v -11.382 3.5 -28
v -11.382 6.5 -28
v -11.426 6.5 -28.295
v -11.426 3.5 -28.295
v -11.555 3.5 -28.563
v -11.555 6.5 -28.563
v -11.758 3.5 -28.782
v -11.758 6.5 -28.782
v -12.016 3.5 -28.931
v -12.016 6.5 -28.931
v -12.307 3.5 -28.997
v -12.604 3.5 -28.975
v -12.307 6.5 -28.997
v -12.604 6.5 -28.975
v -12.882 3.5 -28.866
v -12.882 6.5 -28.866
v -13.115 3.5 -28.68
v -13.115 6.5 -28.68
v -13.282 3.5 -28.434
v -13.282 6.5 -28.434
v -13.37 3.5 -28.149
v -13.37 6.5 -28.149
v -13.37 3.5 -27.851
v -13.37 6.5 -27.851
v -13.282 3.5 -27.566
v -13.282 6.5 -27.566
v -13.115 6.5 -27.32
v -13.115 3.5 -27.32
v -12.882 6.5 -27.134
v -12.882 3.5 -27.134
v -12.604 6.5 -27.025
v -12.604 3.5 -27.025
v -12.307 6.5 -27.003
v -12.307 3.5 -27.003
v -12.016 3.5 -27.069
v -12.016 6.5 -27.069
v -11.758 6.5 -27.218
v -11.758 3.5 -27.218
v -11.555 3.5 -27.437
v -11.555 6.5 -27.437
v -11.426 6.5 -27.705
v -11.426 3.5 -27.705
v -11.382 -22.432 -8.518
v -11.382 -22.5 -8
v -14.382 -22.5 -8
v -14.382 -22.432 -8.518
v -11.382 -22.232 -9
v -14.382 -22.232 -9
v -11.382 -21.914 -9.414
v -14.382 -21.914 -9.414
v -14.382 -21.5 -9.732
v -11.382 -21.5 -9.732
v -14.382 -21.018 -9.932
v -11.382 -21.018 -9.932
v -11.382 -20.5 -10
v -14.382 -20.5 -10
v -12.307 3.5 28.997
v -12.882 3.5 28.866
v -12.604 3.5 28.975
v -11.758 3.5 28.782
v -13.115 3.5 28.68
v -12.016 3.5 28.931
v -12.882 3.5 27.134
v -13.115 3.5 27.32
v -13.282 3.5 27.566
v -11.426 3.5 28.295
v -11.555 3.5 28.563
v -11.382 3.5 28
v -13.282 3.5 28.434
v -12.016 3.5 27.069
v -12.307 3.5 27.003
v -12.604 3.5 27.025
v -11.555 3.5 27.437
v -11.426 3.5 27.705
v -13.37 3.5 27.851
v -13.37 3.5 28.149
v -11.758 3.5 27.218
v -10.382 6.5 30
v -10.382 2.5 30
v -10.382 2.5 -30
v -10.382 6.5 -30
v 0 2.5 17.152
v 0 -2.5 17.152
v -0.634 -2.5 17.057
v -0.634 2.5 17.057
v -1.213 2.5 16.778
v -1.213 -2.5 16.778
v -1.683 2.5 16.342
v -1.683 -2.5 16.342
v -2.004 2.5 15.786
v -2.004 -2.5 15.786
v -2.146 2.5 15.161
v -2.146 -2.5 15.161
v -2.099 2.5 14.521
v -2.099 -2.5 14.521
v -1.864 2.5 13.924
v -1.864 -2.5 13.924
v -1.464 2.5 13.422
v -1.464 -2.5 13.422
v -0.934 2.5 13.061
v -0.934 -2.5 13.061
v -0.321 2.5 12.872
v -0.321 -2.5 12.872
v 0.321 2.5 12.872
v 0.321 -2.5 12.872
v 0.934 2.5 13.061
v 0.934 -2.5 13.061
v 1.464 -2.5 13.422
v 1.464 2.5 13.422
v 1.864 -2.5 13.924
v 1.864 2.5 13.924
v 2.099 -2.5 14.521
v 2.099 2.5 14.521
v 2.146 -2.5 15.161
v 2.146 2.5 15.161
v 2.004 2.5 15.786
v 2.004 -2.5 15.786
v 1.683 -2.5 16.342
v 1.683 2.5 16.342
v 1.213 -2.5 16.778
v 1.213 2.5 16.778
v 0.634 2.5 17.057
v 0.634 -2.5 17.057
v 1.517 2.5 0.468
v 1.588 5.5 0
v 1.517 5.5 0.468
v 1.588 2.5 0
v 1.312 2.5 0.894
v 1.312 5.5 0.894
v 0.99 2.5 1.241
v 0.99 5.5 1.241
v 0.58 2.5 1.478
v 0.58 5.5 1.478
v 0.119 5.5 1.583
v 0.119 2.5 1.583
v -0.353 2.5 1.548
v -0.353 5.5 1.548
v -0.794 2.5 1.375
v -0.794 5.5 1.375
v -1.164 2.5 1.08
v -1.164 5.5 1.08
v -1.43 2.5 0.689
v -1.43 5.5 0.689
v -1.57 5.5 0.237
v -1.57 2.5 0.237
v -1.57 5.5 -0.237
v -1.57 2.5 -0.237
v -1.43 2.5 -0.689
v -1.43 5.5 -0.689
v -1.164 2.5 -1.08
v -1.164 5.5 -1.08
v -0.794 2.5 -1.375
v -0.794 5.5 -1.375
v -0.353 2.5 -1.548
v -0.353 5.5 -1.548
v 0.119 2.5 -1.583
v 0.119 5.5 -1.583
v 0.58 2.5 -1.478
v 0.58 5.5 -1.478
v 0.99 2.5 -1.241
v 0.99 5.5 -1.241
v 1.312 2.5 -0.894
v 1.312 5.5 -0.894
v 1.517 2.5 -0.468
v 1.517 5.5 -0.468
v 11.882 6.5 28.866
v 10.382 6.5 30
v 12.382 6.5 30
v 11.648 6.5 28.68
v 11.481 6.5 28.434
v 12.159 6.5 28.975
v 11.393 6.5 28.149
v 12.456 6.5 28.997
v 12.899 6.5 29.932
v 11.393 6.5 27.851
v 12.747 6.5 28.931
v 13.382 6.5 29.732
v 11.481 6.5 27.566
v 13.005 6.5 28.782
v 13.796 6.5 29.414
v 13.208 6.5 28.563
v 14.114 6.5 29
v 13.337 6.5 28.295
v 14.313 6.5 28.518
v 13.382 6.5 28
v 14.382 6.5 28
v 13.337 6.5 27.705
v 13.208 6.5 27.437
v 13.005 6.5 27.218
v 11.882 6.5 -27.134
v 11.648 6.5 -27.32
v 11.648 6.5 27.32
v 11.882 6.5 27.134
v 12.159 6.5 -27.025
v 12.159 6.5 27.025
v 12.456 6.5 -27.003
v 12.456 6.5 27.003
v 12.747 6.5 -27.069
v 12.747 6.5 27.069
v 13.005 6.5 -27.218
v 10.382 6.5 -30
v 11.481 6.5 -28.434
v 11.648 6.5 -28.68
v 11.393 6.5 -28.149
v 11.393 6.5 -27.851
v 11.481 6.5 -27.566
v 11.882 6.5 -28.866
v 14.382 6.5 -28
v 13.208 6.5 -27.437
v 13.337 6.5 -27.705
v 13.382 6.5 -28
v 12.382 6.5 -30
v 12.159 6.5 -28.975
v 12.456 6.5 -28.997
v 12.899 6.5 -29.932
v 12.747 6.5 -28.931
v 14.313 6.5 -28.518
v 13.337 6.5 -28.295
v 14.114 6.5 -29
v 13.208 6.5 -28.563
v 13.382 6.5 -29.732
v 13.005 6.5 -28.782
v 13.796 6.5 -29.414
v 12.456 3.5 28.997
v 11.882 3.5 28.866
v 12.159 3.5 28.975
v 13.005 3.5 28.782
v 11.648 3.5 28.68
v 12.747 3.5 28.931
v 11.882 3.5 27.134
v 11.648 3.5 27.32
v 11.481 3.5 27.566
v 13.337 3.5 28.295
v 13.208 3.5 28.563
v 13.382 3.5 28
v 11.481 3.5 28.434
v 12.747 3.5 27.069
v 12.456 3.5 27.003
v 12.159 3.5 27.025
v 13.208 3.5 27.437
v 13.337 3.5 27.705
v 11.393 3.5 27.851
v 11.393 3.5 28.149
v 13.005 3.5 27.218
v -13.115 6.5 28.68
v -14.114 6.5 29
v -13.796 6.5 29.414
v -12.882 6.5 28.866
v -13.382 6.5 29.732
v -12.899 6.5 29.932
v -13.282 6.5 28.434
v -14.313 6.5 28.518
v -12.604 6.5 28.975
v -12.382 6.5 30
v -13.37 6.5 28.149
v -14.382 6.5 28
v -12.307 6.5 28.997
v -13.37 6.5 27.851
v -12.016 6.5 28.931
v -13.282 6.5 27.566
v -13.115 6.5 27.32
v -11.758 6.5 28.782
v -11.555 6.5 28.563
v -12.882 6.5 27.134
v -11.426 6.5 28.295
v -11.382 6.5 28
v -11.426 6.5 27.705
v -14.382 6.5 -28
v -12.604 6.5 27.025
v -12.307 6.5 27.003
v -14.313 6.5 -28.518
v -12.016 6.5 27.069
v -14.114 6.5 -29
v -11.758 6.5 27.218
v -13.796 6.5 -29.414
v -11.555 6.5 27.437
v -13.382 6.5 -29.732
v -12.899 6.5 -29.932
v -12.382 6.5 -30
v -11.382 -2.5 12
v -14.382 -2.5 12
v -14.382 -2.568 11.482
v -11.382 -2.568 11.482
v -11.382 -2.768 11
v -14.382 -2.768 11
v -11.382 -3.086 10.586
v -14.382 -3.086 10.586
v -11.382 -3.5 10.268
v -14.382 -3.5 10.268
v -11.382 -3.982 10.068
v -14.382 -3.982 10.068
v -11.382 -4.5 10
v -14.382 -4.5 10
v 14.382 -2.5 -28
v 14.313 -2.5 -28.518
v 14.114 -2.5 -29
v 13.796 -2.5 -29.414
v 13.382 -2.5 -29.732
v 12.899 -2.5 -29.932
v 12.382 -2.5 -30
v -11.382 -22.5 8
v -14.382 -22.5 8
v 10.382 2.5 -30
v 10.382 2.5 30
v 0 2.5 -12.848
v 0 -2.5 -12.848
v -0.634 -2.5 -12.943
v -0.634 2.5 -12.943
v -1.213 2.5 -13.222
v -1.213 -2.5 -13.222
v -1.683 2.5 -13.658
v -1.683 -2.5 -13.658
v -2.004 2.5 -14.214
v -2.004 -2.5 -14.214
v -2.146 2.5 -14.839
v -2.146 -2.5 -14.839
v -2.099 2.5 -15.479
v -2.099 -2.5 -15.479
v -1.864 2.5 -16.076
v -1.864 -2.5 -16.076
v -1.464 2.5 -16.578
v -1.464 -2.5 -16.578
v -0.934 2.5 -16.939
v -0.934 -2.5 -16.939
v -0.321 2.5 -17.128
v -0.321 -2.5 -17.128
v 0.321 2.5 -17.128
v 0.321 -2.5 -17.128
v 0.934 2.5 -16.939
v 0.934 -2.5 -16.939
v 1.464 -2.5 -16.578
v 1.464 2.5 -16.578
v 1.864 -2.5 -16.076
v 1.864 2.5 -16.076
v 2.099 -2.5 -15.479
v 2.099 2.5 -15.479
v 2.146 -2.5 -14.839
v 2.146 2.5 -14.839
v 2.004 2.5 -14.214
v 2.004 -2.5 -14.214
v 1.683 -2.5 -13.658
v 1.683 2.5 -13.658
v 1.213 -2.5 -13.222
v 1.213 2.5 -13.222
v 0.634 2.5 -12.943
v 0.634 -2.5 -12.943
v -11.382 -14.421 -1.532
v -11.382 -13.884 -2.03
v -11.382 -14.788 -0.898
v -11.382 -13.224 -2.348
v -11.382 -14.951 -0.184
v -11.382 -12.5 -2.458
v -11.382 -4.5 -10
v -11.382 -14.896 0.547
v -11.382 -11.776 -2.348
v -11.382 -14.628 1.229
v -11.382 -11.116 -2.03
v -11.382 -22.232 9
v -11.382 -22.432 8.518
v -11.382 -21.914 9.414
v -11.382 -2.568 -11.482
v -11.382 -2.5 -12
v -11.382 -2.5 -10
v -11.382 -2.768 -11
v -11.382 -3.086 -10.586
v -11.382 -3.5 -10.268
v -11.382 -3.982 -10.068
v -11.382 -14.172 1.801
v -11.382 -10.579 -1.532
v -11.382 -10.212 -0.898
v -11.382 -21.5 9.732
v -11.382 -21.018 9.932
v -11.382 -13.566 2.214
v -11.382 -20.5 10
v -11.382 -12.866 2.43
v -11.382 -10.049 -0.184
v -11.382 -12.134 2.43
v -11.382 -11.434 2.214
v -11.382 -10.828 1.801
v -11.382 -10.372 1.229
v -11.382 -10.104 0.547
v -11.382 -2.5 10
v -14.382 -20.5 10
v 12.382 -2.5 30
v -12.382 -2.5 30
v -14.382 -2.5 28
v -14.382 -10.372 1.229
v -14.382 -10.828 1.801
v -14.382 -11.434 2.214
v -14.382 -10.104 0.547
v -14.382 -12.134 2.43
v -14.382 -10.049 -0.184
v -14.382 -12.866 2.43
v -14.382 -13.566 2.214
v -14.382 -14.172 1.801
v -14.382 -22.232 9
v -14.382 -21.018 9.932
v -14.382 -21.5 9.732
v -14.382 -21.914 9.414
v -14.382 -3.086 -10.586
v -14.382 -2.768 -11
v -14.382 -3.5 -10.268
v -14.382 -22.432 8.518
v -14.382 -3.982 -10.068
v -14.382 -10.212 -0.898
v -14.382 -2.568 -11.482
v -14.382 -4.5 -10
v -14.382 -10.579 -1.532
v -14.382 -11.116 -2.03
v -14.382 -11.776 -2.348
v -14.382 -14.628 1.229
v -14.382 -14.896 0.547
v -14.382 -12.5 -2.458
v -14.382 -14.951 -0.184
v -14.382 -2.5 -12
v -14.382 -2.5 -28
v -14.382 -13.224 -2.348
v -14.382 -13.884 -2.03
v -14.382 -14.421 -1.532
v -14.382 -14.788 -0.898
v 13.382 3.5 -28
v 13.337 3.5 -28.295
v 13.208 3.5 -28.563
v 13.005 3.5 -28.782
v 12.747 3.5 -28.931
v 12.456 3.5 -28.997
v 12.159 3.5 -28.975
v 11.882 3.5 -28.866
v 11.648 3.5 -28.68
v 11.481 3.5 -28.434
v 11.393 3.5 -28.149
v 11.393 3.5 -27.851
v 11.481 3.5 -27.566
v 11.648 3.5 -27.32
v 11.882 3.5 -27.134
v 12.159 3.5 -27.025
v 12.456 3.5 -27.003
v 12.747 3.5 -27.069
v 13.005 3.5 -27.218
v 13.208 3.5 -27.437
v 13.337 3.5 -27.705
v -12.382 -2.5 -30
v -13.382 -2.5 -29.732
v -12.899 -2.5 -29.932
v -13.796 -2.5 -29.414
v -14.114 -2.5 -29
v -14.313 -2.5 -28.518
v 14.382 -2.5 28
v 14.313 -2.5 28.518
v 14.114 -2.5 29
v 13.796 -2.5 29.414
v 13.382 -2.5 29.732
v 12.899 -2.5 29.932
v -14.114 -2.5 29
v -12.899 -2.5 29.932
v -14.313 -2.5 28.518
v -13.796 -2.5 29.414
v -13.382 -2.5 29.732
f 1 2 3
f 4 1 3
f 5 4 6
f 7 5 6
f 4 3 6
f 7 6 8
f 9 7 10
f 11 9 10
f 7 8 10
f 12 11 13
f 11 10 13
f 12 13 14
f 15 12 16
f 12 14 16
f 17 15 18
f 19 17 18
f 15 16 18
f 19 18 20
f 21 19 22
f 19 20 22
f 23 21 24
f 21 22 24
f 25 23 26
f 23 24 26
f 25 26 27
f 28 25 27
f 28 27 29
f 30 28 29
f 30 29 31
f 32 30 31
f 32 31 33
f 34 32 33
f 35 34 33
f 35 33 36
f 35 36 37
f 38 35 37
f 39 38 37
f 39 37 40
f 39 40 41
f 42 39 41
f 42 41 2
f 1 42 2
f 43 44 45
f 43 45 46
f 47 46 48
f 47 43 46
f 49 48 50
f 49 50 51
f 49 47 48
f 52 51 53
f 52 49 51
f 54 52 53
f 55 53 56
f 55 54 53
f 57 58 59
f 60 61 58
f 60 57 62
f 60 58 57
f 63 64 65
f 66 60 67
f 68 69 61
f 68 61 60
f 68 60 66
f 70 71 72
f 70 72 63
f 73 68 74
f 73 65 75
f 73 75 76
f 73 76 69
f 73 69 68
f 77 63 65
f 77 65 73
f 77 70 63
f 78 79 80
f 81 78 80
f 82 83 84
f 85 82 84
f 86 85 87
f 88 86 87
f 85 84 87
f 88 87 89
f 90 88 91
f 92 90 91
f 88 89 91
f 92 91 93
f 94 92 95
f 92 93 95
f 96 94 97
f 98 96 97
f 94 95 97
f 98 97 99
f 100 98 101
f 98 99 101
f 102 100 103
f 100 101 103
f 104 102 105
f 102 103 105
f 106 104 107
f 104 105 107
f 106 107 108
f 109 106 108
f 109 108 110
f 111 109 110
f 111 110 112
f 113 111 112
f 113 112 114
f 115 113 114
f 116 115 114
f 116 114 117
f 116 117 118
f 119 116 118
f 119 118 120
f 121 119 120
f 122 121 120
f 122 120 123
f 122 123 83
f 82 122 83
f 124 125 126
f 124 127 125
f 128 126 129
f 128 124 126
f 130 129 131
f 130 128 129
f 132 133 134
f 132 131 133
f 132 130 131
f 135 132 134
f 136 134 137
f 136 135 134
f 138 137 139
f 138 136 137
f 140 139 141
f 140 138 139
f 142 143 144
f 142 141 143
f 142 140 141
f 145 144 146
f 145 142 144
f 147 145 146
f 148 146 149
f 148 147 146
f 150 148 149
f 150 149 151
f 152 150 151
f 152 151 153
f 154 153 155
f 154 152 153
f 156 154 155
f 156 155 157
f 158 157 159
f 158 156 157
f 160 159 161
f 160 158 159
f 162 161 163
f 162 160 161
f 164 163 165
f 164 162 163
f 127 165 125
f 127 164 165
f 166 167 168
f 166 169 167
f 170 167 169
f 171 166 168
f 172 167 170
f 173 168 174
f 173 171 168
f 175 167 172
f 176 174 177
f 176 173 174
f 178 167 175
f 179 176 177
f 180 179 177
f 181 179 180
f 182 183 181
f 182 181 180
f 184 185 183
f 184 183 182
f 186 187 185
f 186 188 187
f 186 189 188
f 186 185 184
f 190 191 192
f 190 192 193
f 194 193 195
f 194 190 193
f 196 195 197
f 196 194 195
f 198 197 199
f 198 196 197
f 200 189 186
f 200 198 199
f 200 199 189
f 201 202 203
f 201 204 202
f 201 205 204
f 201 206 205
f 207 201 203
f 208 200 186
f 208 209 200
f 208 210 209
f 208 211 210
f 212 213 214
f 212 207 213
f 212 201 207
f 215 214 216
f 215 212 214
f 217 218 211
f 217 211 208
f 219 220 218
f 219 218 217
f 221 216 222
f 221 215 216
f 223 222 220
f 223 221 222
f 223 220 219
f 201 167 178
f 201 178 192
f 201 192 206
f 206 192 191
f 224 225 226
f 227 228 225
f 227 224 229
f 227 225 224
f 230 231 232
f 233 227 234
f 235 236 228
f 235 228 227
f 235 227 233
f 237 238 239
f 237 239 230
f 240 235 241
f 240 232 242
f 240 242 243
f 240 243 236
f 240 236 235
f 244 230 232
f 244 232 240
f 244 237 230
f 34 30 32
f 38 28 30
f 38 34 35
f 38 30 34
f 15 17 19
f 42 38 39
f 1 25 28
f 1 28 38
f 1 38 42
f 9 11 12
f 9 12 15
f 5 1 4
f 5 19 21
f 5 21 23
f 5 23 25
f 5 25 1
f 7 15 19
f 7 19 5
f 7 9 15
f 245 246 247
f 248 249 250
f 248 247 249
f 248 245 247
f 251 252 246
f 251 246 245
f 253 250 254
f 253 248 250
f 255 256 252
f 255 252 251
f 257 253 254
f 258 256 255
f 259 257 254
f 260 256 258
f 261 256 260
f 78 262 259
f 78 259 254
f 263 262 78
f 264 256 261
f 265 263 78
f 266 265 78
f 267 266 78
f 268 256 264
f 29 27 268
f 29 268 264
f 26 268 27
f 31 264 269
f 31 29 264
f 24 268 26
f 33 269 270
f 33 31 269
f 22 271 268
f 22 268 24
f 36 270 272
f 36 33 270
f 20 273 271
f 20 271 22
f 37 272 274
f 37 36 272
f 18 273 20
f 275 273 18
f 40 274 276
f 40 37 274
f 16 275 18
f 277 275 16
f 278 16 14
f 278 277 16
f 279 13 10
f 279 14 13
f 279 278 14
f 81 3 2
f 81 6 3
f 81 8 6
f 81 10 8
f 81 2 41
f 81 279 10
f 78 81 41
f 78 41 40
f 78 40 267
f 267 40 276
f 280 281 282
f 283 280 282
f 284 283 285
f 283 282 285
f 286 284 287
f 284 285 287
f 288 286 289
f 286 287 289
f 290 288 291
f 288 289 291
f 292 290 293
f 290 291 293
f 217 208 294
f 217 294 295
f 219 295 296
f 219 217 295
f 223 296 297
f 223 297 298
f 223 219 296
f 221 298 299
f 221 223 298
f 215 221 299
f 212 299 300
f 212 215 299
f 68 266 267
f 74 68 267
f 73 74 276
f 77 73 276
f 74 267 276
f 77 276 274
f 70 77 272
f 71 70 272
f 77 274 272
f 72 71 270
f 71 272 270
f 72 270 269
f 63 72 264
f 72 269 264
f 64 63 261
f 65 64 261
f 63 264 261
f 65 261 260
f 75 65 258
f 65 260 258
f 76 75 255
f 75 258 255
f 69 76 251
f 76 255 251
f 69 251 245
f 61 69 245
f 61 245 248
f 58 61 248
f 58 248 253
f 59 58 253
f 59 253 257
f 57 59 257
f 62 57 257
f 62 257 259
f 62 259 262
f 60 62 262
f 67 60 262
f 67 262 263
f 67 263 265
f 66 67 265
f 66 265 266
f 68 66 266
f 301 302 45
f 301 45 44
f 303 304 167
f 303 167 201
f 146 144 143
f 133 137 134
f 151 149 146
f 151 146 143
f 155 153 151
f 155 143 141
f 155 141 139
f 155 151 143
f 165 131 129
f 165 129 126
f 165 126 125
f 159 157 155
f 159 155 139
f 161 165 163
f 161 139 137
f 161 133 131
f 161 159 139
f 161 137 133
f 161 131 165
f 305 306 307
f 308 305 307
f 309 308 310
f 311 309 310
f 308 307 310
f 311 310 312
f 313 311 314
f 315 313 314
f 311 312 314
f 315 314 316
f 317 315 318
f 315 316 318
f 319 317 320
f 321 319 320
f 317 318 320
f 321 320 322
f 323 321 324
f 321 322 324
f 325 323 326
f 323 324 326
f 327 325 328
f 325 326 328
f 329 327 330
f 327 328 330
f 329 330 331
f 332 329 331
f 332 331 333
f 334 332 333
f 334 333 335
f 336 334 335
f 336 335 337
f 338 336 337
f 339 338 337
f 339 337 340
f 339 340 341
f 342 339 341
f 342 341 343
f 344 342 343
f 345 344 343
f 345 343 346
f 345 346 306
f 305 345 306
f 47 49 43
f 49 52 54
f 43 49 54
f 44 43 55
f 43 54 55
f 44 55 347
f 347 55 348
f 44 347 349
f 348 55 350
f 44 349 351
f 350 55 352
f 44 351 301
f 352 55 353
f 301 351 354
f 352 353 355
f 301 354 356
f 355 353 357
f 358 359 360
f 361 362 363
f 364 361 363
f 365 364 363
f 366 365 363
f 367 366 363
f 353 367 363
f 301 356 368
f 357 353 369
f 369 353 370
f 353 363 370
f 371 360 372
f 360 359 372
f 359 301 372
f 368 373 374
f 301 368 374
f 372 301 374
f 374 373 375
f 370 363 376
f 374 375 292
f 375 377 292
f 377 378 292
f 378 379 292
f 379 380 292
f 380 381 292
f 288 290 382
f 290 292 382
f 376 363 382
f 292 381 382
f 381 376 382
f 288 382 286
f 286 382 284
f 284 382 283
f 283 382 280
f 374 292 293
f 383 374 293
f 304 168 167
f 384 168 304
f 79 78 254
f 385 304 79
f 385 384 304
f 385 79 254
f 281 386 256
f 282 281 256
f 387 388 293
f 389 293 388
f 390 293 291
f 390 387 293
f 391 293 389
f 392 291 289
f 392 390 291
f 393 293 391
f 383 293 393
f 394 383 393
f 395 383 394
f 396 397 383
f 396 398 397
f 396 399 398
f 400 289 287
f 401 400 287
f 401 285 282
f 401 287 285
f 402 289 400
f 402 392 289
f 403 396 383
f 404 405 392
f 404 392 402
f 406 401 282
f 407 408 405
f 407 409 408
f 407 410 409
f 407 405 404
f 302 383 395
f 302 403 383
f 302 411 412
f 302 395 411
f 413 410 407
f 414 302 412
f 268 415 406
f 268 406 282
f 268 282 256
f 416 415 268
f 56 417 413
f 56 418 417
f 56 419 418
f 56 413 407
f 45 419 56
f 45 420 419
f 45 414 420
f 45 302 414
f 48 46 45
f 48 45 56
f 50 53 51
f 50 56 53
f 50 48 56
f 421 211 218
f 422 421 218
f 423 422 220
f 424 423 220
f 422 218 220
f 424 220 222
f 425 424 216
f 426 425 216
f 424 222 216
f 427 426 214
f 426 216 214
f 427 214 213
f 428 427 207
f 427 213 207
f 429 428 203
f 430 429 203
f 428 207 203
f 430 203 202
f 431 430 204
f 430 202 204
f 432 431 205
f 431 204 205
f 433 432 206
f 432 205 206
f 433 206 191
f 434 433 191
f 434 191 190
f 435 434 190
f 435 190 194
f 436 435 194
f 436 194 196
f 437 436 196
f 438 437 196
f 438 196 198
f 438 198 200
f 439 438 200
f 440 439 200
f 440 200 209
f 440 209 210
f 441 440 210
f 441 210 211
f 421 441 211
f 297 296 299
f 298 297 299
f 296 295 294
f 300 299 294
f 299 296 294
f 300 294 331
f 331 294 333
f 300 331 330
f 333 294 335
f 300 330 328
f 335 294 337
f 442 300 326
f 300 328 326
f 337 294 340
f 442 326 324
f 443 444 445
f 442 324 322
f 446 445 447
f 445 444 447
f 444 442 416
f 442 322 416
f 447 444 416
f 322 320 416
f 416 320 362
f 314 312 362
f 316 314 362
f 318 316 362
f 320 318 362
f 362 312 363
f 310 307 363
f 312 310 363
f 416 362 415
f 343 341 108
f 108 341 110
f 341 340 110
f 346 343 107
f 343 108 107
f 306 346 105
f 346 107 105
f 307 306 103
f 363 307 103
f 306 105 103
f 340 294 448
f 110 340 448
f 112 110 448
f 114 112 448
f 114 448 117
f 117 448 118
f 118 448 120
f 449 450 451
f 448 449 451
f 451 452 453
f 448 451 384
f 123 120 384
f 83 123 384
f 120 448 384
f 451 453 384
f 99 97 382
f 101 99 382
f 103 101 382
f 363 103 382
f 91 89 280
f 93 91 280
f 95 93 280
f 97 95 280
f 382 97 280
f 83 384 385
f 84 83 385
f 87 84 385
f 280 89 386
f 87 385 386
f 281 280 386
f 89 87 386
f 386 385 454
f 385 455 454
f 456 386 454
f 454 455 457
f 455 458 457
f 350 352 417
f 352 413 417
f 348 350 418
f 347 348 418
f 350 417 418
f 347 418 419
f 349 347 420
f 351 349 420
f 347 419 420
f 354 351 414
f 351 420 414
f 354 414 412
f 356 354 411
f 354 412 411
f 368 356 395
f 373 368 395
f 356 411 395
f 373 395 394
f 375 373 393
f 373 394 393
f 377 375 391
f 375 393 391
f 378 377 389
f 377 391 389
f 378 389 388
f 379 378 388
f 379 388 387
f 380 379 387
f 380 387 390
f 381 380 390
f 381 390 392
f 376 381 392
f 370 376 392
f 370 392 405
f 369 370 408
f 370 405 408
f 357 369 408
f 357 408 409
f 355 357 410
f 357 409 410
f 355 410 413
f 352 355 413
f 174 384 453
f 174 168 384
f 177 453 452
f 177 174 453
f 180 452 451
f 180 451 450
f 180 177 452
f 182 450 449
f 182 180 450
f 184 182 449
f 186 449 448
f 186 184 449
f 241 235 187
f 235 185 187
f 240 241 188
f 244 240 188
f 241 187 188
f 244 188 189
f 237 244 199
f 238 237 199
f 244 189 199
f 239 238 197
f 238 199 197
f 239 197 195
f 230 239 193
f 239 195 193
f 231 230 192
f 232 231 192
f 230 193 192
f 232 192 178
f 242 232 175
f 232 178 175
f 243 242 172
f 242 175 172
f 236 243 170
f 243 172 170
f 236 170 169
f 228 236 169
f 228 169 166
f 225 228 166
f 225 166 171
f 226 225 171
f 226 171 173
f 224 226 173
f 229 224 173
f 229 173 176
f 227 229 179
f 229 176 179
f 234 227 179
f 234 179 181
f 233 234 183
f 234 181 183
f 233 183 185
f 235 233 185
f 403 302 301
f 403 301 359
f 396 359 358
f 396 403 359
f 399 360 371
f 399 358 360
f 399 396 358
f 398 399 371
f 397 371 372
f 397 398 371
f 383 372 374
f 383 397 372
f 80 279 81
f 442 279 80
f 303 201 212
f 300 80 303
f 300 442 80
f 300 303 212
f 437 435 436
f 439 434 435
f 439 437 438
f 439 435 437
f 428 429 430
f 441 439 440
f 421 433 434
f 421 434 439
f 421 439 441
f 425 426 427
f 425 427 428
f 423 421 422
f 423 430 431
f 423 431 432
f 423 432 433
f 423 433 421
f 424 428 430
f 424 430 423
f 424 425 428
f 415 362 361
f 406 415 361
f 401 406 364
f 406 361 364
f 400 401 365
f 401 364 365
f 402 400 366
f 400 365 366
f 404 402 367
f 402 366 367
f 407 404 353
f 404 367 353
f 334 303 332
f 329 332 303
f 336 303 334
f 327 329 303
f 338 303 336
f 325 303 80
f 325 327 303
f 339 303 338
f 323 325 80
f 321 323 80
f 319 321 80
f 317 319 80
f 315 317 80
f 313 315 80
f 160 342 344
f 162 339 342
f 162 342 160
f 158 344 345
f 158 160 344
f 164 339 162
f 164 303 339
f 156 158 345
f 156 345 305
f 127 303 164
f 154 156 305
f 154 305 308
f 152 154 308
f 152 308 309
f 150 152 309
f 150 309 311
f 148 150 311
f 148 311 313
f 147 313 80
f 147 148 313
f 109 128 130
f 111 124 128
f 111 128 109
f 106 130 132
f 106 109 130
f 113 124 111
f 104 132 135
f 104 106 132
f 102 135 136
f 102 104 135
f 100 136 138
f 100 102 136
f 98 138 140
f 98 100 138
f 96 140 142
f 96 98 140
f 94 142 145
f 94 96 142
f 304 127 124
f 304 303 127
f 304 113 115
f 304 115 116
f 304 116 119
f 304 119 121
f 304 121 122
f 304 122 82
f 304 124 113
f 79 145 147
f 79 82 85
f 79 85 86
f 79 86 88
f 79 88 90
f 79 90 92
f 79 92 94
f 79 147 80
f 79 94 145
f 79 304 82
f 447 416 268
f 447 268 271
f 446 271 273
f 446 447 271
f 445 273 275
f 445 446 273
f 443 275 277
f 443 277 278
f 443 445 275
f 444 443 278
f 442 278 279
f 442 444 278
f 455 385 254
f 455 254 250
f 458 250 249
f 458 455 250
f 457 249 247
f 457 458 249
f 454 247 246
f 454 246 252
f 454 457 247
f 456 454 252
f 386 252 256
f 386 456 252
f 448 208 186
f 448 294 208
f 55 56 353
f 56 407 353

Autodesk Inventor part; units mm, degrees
ref_plane "YZ Plane" through (0, 0, 0) normal (1, 0, 0) x (0, 1, 0)
ref_plane "XZ Plane" through (0, 0, 0) normal (0, 1, 0) x (-1, 0, 0)
ref_plane "XY Plane" through (0, 0, 0) normal (0, 0, 1) x (1, 0, 0)
sketch "Sketch1" plane through (0, 0, 0) normal (0, 1, 0) x (-1, 0, 0)
  line L0 (-14.3815, 30) -> (14.3815, 30)
  line L1 (14.3815, 30) -> (14.3815, -30)
  line L2 (14.3815, -30) -> (-14.3815, -30)
  line L3 (-14.3815, -30) -> (-14.3815, 30)
  line L4 (-14.3815, 30) -> (14.3815, -30) construction
  line L5 (14.3815, 30) -> (-14.3815, -30) construction
  point P0 (0, 0)
  dimension "d0" = 60
  dimension "d1" = 28.763
extrude "Extrusion1" add sketch "Sketch1" along normal mid plane 5
sketch "Sketch2" plane through (0, 2.5, 0) normal (0, 1, 0) x (1, 0, 0)
  line L0 (-14.3815, -30) -> (14.3815, -30) projected
  line L1 (-14.3815, -30) -> (-10.3815, -30)
  line L2 (-10.3815, -30) -> (-10.3815, 30)
  line L3 (-10.3815, 30) -> (-14.3815, 30)
  line L4 (-14.3815, 30) -> (-14.3815, -30)
  line L5 (14.3815, 30) -> (-14.3815, 30) projected
  line L6 (14.3815, -30) -> (10.3815, -30)
  line L7 (10.3815, -30) -> (10.3815, 30)
  line L8 (10.3815, 30) -> (14.3815, 30)
  line L9 (14.3815, 30) -> (14.3815, -30)
  point P0 (0, 0)
  dimension "d4" = 4
  dimension "d5" = 4
extrude "Extrusion2" add sketch "Sketch2" along normal blind 4 contours L4 L3 L2 L0 | L7 L5 L9 L0
sketch "Sketch3" plane through (0, 2.5, 0) normal (0, 1, 0) x (1, 0, 0)
  circle A0 centre (0, 0) radius 1.5875
  dimension "d8" = 3.175
extrude "Extrusion3" add sketch "Sketch3" along normal blind 3
sketch "Sketch4" plane through (0, 2.5, 0) normal (0, 1, 0) x (1, 0, 0)
  line L0 (0, 0) -> (0, -30) construction
  line L1 (0, 0) -> (0, 30) construction
  line L2 (-10.3815, -30) -> (10.3815, -30) construction
  line L3 (10.3815, 30) -> (-10.3815, 30) construction
  point P0 (0, -15)
  point P1 (0, 15)
hole "Hole1" at (0, 2.5, 15) at (0, 2.5, -15) direction (0, -1, 0) diameter 4.305 end through all clearance for "Flat Head Machine Screw (82)" size "#6" standard "Ansi Unified Screw Threads"
sketch "Sketch5" plane through (0, 6.5, 0) normal (0, 1, 0) x (1, 0, 0)
  circle A0 centre (-12.3815, 28) radius 1
  circle A1 centre (-12.3815, -28) radius 1
  circle A2 centre (12.3815, -28) radius 1
  circle A3 centre (12.3815, 28) radius 1
  line L0 (-10.3815, 30) -> (-14.3815, 30) projected
  line L1 (14.3815, 30) -> (10.3815, 30) projected
  line L2 (-14.3815, -30) -> (-10.3815, -30) projected
  point P0 (0, 0)
  point P1 (-12.3815, 30)
  point P2 (12.3815, 30)
  dimension "d18" = 2
  dimension "d19" = 2
  dimension "d20" = 2
extrude "Extrusion4" cut sketch "Sketch5" against normal blind 3
sketch "Sketch7" plane through (0, -2.5, 0) normal (0, -1, 0) x (1, 0, 0)
  line L0 (14.3815, 30) -> (-14.3815, 30) projected
  line L1 (-14.3815, -10) -> (-11.3815, -10)
  line L2 (-11.3815, -10) -> (-11.3815, 10)
  line L3 (-11.3815, 10) -> (-14.3815, 10)
  line L4 (-14.3815, 10) -> (-14.3815, -10)
  line L5 (-14.3815, 30) -> (-14.3815, -30) projected
  point P0 (0, 0)
  point P1 (-14.3815, 0)
  dimension "d25" = 3
  dimension "d26" = 20
extrude "Extrusion5" add sketch "Sketch7" along normal blind 20
sketch "Sketch8" plane through (-11.3815, -2.5, 10) normal (1, 0, 0) x (0, 0, -1)
  line L0 (0, 0) -> (0, -20) projected
  line L1 (20, -20) -> (0, -20) projected
  point P0 (10, 2.5)
  point P1 (10, -10)
  point P2 (0, -10)
  point P3 (10, -20)
hole "Hole2" at (-11.3815, -12.5, 0) direction (-1, 0, 0) diameter 4.915 end through all clearance for "Flat Head Machine Screw (82)" size "#8" standard "Ansi Unified Screw Threads"
fillet "Fillet1" radius 2 8 edges at (14.3815, 2, 30) (-14.3815, 2, 30) (-14.3815, 2, -30) (14.3815, 2, -30) (-12.8815, -2.5, -10) (-12.8815, -2.5, 10) (-12.8815, -22.5, 10) (-12.8815, -22.5, -10)
equation "\"d5\" = d4"
equation "\"d20\" = d19"
equation "\"BendRadius\" = Thickness"
equation "\"BendReliefWidth\" = Thickness"
equation "\"BendReliefDepth\" = 0.5 * Thickness"
equation "\"CornerReliefSize\" = 4 * Thickness"
equation "\"MinimumRemnant\" = 2 * Thickness"
equation "\"TransitionRadius\" = BendRadius"
equation "\"JacobiRadiusSize\" = Thickness"
equation "\"GapSize\" = Thickness"
equation "\"Thickness\" = 0.5"
properties part number "CameraLinearSupporter"
